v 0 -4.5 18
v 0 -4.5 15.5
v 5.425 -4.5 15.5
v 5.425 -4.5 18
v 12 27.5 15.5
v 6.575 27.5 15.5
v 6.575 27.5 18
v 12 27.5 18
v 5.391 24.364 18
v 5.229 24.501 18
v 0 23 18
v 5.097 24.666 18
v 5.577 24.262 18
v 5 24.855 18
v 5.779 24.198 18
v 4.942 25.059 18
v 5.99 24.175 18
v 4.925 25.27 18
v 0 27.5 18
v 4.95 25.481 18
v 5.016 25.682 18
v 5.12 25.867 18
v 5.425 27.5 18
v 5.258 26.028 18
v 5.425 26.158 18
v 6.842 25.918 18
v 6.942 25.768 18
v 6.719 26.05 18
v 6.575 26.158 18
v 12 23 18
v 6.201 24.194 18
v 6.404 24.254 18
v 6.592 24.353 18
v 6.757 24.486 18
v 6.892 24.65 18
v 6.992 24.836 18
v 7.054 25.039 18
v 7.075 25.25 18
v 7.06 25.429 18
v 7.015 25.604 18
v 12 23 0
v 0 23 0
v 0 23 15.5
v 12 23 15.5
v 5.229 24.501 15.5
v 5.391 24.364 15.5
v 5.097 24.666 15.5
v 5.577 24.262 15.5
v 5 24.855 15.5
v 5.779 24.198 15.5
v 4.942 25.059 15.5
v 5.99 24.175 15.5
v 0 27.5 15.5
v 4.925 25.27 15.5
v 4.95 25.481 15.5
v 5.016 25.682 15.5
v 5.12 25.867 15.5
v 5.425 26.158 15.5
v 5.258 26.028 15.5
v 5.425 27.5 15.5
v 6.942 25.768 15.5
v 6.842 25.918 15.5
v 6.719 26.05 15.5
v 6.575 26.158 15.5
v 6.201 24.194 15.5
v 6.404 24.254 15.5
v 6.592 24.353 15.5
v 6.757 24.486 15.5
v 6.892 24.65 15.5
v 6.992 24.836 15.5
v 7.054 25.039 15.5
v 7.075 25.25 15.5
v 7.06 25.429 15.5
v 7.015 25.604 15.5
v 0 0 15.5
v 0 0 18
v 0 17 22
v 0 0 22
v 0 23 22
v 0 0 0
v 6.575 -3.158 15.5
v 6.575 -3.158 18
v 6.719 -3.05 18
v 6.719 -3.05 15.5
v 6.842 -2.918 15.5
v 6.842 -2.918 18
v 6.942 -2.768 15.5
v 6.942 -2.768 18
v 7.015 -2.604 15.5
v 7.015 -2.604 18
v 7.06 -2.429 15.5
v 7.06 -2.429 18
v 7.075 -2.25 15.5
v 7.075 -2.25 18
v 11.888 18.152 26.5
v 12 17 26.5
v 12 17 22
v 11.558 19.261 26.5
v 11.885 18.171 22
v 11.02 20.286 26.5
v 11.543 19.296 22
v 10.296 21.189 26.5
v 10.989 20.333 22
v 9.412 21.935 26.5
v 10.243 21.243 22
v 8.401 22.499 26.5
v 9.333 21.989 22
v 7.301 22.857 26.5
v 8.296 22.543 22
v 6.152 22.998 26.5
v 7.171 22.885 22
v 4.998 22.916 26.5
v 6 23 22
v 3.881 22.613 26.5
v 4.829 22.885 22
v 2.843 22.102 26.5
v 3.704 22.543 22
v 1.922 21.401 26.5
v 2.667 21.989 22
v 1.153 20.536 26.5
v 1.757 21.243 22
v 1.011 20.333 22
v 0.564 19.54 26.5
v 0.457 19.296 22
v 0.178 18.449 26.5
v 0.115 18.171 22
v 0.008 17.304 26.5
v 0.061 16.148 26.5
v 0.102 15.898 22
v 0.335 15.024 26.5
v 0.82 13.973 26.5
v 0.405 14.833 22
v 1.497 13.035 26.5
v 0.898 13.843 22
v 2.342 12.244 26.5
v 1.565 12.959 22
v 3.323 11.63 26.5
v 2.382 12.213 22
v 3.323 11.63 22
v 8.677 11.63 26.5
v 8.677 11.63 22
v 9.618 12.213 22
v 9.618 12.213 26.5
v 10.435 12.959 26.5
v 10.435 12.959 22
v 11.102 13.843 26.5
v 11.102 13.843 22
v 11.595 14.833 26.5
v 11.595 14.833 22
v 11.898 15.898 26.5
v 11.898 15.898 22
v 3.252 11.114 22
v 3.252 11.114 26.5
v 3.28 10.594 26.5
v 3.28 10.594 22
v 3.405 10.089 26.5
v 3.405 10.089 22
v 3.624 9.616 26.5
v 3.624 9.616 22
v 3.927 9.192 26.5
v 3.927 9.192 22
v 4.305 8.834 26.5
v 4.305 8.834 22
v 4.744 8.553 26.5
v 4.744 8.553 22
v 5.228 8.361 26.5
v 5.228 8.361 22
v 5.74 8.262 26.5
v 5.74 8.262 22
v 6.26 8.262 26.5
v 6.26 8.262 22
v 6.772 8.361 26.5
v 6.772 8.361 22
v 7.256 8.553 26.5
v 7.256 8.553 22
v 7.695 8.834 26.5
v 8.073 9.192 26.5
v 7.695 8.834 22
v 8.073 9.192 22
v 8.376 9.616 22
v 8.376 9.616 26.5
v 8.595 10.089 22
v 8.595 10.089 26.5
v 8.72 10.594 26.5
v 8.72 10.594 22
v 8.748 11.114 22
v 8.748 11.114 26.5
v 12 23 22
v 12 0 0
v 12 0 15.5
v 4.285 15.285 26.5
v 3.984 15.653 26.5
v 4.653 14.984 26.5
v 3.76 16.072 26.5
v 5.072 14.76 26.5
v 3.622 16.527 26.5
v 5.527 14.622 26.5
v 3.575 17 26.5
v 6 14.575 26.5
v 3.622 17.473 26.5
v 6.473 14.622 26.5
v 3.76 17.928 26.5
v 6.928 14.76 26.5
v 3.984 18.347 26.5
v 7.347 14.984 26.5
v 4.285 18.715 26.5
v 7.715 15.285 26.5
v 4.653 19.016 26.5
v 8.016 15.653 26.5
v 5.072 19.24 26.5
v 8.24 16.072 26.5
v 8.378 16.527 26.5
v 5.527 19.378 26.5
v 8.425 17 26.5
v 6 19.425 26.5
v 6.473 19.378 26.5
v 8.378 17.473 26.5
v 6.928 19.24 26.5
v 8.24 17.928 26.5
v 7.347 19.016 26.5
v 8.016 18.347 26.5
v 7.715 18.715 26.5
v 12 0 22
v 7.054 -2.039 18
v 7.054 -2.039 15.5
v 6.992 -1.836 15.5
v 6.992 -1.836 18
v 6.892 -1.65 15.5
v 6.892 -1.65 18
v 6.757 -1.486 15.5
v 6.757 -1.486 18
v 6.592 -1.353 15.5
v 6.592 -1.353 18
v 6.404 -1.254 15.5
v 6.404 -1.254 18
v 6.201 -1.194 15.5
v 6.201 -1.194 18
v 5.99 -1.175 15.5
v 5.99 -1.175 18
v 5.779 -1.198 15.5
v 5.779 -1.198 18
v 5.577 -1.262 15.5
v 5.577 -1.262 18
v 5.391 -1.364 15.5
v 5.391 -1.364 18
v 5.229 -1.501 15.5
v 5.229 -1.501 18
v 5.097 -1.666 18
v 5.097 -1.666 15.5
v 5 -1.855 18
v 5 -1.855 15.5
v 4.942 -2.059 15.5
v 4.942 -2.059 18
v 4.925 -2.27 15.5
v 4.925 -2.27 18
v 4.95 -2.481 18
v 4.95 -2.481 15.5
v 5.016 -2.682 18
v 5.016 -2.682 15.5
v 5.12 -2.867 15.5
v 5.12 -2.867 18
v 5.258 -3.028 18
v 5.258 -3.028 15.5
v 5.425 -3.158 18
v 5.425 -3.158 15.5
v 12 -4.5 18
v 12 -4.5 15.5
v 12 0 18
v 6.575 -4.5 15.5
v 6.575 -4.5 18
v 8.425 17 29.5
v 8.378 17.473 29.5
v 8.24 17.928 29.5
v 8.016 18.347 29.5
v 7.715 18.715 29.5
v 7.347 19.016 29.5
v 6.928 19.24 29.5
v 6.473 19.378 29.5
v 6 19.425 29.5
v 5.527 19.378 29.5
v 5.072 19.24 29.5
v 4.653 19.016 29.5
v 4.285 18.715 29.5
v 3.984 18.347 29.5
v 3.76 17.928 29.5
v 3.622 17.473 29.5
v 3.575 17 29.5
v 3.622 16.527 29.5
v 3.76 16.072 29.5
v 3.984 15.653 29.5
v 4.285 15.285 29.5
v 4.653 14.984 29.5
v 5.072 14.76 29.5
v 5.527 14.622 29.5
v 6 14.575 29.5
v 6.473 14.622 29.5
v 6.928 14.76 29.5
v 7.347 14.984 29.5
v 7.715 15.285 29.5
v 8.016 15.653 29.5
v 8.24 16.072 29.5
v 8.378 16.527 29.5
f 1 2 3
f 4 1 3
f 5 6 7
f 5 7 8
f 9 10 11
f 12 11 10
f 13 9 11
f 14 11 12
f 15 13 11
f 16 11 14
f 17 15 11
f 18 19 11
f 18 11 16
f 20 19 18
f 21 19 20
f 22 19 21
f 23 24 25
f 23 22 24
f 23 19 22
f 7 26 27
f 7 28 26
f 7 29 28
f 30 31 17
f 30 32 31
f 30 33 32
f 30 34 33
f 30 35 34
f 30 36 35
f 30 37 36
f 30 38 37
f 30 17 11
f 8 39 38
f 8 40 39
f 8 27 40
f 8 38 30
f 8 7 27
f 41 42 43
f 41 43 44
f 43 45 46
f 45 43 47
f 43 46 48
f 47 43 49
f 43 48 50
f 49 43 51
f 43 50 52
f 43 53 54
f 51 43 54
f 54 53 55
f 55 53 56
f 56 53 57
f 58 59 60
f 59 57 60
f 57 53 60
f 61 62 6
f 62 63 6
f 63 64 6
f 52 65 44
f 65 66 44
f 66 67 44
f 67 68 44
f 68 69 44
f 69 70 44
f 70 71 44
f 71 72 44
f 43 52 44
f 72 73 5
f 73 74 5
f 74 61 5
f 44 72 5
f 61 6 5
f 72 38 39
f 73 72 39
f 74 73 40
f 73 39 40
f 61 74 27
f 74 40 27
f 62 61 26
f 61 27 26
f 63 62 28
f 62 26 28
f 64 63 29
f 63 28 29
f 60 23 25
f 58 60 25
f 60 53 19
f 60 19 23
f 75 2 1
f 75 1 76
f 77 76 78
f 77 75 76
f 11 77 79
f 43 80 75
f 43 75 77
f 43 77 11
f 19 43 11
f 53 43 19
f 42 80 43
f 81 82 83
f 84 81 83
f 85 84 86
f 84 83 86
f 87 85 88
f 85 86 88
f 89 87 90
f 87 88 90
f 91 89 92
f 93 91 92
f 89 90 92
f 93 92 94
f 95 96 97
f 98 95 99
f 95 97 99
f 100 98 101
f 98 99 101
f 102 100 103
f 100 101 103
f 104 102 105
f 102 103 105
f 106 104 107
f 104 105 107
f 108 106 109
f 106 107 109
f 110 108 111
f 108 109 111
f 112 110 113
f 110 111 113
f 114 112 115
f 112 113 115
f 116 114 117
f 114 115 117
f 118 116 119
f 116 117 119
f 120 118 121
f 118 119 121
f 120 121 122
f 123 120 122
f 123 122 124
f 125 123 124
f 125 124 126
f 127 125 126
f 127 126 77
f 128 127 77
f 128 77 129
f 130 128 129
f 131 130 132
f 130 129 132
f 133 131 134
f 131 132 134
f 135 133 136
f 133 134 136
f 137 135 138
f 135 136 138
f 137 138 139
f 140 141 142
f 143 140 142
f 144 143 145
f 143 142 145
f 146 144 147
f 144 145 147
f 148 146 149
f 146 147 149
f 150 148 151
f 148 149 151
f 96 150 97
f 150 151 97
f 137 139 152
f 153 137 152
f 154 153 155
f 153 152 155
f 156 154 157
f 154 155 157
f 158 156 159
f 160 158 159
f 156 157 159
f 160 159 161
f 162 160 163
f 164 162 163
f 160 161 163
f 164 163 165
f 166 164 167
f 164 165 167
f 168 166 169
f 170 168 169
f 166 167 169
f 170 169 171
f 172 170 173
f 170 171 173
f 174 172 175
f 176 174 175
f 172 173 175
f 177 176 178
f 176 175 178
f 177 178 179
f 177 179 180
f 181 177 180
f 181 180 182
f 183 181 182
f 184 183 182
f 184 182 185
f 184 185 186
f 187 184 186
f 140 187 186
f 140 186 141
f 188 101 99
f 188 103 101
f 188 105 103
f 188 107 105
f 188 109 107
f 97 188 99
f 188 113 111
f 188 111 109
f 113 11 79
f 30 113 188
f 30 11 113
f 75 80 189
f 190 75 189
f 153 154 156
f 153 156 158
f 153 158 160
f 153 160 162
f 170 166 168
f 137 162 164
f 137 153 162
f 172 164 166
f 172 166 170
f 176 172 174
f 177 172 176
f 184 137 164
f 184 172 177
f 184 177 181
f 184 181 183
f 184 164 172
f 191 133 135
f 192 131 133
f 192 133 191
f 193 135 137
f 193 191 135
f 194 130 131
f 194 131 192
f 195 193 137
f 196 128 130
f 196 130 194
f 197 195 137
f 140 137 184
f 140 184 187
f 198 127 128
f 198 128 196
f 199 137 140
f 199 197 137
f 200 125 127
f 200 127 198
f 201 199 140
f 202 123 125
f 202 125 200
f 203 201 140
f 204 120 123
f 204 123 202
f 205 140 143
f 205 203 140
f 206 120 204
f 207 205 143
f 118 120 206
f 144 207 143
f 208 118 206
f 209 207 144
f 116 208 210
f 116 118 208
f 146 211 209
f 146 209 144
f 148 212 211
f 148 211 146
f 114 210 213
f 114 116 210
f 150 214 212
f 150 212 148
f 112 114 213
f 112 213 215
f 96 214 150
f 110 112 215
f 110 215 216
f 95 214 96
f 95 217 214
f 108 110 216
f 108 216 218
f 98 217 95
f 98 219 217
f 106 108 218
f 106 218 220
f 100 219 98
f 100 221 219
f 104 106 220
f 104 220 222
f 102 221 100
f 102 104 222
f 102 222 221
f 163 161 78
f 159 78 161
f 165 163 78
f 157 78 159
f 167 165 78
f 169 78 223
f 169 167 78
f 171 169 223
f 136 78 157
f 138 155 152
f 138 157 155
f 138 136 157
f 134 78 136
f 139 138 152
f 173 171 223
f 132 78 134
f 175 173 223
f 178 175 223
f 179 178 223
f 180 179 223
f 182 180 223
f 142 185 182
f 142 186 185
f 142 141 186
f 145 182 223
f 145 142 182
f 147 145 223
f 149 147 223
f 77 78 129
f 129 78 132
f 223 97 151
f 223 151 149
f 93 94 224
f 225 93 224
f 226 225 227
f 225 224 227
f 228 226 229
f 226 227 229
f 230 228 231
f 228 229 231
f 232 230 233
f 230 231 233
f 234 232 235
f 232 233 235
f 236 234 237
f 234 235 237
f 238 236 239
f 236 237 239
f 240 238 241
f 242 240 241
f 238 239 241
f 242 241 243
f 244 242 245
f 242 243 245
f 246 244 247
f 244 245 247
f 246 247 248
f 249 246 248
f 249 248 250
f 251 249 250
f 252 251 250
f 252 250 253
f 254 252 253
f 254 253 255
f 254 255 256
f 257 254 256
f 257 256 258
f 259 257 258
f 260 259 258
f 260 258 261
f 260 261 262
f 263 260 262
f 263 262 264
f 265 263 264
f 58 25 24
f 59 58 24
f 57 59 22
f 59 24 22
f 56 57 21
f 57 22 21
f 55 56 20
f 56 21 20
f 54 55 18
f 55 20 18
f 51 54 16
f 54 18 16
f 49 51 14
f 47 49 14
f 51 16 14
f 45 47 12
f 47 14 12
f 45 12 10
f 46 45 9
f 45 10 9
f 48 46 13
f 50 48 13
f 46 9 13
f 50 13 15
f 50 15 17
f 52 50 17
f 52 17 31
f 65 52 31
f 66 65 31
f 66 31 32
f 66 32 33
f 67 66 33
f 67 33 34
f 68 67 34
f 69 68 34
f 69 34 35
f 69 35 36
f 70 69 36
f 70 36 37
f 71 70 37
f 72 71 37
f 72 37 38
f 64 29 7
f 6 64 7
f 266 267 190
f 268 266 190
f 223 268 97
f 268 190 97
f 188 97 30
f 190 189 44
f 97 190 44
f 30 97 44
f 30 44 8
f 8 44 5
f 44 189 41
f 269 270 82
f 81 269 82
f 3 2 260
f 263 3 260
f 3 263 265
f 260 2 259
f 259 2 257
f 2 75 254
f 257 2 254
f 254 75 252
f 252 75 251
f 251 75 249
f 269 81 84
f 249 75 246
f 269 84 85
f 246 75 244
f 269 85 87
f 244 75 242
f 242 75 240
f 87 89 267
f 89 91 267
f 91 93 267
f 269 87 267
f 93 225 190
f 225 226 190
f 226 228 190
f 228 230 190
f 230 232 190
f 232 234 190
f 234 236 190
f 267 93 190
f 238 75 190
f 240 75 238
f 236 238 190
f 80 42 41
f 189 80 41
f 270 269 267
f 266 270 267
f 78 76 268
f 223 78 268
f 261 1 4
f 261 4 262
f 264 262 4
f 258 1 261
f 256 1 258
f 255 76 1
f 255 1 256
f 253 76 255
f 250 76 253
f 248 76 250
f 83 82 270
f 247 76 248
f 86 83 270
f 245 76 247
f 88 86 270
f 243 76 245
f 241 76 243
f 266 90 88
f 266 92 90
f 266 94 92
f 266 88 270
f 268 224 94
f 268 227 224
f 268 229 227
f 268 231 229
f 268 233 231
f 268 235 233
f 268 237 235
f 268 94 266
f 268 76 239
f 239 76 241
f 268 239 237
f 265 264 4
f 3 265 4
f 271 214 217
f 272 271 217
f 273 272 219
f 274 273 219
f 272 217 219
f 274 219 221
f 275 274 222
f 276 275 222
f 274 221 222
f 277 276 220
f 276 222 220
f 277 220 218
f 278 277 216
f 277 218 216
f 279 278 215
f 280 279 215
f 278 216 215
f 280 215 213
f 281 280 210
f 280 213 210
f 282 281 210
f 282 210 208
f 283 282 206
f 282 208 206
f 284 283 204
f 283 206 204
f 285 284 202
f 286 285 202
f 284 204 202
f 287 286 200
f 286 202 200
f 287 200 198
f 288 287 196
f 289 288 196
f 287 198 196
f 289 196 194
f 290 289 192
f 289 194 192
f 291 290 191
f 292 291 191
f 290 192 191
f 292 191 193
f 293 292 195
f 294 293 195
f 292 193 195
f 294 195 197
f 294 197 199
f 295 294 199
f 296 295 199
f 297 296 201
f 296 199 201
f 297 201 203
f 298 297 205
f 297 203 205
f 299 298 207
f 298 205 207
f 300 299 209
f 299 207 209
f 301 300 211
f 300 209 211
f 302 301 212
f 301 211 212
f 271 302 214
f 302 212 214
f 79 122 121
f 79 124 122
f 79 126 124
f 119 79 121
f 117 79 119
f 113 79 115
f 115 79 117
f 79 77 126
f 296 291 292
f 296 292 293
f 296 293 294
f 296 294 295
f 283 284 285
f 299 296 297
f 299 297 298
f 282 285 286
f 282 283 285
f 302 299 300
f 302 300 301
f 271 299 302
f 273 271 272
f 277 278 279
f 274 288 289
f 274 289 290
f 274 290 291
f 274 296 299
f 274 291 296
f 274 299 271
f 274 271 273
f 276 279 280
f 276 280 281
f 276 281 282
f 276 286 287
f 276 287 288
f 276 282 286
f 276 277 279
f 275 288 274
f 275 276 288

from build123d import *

# Parameters (mm, degrees)
F0_W      = 12
F0_H      = 23
F1_DEPTH  = 22
F3_W      = 12
F3_H      = 4.5
F4_DEPTH  = 2.5
F6_DEPTH  = 18.001
F8_DEPTH  = 4.5
F9_R      = 2.425
F10_DEPTH = 3


with BuildPart() as f1:
    # F0 (on Top) → F1 (new body)
    with BuildSketch(Plane.XY):
        with Locations((6, 11.5)):
            Rectangle(F0_W, F0_H)
    extrude(amount=F1_DEPTH)

    # F3 (on offset) → F4 (join)
    with BuildSketch(Plane.XY.offset(15.5)):
        with Locations((6, 25.25)):
            Rectangle(F3_W, F3_H)
        with Locations((6, -2.25)):
            Rectangle(F3_W, F3_H)
    extrude(amount=F4_DEPTH)

    # F5 (on face) → F6 (cut, through all)
    with BuildSketch(Plane.XY.offset(18)):
        with BuildLine():
            ThreePointArc((5.425, 26.158295), (5.481589, 24.30826), (7.075, 25.25))
            ThreePointArc((7.075, 25.25), (6.94174, 25.768411), (6.575, 26.158295))
            ThreePointArc((6.575, 26.158295), (6, 26.325), (5.425, 26.158295))
        make_face()
        with BuildLine():
            ThreePointArc((5.425, 26.158295), (6, 26.325), (6.575, 26.158295))
            Line((6.575, 26.158295), (6.575, 27.5))
            Line((6.575, 27.5), (5.425, 27.5))
            Line((5.425, 27.5), (5.425, 26.158295))
        make_face()
        with BuildLine():
            Line((5.425, -4.5), (6.575, -4.5))
            Line((6.575, -4.5), (6.575, -3.158295))
            ThreePointArc((6.575, -3.158295), (6, -3.325), (5.425, -3.158295))
            Line((5.425, -3.158295), (5.425, -4.5))
        make_face()
        with BuildLine():
            ThreePointArc((5.425, -3.158295), (6, -3.325), (6.575, -3.158295))
            ThreePointArc((6.575, -3.158295), (6.94174, -2.768411), (7.075, -2.25))
            ThreePointArc((7.075, -2.25), (5.481589, -1.30826), (5.425, -3.158295))
        make_face()
    extrude(amount=-F6_DEPTH, mode=Mode.SUBTRACT)

    # F7 (on face) → F8 (join)
    with BuildSketch(Plane.XY.offset(22)):
        with BuildLine():
            ThreePointArc((8.676815, 11.630208), (11.102004, 13.84254), (12, 17))
            ThreePointArc((12, 17), (2.84254, 22.102004), (3.323185, 11.630208))
            ThreePointArc((3.323185, 11.630208), (6, 11), (8.676815, 11.630208))
        make_face()
        with BuildLine():
            ThreePointArc((8.676815, 11.630208), (6, 11), (3.323185, 11.630208))
            ThreePointArc((3.323185, 11.630208), (6, 8.25), (8.676815, 11.630208))
        make_face()
    extrude(amount=F8_DEPTH)

    # F9 (on face) → F10 (join)
    with BuildSketch(Plane.XY.offset(26.5)):
        with Locations((6, 17)):
            Circle(F9_R)
    extrude(amount=F10_DEPTH)


solid = f1.part
